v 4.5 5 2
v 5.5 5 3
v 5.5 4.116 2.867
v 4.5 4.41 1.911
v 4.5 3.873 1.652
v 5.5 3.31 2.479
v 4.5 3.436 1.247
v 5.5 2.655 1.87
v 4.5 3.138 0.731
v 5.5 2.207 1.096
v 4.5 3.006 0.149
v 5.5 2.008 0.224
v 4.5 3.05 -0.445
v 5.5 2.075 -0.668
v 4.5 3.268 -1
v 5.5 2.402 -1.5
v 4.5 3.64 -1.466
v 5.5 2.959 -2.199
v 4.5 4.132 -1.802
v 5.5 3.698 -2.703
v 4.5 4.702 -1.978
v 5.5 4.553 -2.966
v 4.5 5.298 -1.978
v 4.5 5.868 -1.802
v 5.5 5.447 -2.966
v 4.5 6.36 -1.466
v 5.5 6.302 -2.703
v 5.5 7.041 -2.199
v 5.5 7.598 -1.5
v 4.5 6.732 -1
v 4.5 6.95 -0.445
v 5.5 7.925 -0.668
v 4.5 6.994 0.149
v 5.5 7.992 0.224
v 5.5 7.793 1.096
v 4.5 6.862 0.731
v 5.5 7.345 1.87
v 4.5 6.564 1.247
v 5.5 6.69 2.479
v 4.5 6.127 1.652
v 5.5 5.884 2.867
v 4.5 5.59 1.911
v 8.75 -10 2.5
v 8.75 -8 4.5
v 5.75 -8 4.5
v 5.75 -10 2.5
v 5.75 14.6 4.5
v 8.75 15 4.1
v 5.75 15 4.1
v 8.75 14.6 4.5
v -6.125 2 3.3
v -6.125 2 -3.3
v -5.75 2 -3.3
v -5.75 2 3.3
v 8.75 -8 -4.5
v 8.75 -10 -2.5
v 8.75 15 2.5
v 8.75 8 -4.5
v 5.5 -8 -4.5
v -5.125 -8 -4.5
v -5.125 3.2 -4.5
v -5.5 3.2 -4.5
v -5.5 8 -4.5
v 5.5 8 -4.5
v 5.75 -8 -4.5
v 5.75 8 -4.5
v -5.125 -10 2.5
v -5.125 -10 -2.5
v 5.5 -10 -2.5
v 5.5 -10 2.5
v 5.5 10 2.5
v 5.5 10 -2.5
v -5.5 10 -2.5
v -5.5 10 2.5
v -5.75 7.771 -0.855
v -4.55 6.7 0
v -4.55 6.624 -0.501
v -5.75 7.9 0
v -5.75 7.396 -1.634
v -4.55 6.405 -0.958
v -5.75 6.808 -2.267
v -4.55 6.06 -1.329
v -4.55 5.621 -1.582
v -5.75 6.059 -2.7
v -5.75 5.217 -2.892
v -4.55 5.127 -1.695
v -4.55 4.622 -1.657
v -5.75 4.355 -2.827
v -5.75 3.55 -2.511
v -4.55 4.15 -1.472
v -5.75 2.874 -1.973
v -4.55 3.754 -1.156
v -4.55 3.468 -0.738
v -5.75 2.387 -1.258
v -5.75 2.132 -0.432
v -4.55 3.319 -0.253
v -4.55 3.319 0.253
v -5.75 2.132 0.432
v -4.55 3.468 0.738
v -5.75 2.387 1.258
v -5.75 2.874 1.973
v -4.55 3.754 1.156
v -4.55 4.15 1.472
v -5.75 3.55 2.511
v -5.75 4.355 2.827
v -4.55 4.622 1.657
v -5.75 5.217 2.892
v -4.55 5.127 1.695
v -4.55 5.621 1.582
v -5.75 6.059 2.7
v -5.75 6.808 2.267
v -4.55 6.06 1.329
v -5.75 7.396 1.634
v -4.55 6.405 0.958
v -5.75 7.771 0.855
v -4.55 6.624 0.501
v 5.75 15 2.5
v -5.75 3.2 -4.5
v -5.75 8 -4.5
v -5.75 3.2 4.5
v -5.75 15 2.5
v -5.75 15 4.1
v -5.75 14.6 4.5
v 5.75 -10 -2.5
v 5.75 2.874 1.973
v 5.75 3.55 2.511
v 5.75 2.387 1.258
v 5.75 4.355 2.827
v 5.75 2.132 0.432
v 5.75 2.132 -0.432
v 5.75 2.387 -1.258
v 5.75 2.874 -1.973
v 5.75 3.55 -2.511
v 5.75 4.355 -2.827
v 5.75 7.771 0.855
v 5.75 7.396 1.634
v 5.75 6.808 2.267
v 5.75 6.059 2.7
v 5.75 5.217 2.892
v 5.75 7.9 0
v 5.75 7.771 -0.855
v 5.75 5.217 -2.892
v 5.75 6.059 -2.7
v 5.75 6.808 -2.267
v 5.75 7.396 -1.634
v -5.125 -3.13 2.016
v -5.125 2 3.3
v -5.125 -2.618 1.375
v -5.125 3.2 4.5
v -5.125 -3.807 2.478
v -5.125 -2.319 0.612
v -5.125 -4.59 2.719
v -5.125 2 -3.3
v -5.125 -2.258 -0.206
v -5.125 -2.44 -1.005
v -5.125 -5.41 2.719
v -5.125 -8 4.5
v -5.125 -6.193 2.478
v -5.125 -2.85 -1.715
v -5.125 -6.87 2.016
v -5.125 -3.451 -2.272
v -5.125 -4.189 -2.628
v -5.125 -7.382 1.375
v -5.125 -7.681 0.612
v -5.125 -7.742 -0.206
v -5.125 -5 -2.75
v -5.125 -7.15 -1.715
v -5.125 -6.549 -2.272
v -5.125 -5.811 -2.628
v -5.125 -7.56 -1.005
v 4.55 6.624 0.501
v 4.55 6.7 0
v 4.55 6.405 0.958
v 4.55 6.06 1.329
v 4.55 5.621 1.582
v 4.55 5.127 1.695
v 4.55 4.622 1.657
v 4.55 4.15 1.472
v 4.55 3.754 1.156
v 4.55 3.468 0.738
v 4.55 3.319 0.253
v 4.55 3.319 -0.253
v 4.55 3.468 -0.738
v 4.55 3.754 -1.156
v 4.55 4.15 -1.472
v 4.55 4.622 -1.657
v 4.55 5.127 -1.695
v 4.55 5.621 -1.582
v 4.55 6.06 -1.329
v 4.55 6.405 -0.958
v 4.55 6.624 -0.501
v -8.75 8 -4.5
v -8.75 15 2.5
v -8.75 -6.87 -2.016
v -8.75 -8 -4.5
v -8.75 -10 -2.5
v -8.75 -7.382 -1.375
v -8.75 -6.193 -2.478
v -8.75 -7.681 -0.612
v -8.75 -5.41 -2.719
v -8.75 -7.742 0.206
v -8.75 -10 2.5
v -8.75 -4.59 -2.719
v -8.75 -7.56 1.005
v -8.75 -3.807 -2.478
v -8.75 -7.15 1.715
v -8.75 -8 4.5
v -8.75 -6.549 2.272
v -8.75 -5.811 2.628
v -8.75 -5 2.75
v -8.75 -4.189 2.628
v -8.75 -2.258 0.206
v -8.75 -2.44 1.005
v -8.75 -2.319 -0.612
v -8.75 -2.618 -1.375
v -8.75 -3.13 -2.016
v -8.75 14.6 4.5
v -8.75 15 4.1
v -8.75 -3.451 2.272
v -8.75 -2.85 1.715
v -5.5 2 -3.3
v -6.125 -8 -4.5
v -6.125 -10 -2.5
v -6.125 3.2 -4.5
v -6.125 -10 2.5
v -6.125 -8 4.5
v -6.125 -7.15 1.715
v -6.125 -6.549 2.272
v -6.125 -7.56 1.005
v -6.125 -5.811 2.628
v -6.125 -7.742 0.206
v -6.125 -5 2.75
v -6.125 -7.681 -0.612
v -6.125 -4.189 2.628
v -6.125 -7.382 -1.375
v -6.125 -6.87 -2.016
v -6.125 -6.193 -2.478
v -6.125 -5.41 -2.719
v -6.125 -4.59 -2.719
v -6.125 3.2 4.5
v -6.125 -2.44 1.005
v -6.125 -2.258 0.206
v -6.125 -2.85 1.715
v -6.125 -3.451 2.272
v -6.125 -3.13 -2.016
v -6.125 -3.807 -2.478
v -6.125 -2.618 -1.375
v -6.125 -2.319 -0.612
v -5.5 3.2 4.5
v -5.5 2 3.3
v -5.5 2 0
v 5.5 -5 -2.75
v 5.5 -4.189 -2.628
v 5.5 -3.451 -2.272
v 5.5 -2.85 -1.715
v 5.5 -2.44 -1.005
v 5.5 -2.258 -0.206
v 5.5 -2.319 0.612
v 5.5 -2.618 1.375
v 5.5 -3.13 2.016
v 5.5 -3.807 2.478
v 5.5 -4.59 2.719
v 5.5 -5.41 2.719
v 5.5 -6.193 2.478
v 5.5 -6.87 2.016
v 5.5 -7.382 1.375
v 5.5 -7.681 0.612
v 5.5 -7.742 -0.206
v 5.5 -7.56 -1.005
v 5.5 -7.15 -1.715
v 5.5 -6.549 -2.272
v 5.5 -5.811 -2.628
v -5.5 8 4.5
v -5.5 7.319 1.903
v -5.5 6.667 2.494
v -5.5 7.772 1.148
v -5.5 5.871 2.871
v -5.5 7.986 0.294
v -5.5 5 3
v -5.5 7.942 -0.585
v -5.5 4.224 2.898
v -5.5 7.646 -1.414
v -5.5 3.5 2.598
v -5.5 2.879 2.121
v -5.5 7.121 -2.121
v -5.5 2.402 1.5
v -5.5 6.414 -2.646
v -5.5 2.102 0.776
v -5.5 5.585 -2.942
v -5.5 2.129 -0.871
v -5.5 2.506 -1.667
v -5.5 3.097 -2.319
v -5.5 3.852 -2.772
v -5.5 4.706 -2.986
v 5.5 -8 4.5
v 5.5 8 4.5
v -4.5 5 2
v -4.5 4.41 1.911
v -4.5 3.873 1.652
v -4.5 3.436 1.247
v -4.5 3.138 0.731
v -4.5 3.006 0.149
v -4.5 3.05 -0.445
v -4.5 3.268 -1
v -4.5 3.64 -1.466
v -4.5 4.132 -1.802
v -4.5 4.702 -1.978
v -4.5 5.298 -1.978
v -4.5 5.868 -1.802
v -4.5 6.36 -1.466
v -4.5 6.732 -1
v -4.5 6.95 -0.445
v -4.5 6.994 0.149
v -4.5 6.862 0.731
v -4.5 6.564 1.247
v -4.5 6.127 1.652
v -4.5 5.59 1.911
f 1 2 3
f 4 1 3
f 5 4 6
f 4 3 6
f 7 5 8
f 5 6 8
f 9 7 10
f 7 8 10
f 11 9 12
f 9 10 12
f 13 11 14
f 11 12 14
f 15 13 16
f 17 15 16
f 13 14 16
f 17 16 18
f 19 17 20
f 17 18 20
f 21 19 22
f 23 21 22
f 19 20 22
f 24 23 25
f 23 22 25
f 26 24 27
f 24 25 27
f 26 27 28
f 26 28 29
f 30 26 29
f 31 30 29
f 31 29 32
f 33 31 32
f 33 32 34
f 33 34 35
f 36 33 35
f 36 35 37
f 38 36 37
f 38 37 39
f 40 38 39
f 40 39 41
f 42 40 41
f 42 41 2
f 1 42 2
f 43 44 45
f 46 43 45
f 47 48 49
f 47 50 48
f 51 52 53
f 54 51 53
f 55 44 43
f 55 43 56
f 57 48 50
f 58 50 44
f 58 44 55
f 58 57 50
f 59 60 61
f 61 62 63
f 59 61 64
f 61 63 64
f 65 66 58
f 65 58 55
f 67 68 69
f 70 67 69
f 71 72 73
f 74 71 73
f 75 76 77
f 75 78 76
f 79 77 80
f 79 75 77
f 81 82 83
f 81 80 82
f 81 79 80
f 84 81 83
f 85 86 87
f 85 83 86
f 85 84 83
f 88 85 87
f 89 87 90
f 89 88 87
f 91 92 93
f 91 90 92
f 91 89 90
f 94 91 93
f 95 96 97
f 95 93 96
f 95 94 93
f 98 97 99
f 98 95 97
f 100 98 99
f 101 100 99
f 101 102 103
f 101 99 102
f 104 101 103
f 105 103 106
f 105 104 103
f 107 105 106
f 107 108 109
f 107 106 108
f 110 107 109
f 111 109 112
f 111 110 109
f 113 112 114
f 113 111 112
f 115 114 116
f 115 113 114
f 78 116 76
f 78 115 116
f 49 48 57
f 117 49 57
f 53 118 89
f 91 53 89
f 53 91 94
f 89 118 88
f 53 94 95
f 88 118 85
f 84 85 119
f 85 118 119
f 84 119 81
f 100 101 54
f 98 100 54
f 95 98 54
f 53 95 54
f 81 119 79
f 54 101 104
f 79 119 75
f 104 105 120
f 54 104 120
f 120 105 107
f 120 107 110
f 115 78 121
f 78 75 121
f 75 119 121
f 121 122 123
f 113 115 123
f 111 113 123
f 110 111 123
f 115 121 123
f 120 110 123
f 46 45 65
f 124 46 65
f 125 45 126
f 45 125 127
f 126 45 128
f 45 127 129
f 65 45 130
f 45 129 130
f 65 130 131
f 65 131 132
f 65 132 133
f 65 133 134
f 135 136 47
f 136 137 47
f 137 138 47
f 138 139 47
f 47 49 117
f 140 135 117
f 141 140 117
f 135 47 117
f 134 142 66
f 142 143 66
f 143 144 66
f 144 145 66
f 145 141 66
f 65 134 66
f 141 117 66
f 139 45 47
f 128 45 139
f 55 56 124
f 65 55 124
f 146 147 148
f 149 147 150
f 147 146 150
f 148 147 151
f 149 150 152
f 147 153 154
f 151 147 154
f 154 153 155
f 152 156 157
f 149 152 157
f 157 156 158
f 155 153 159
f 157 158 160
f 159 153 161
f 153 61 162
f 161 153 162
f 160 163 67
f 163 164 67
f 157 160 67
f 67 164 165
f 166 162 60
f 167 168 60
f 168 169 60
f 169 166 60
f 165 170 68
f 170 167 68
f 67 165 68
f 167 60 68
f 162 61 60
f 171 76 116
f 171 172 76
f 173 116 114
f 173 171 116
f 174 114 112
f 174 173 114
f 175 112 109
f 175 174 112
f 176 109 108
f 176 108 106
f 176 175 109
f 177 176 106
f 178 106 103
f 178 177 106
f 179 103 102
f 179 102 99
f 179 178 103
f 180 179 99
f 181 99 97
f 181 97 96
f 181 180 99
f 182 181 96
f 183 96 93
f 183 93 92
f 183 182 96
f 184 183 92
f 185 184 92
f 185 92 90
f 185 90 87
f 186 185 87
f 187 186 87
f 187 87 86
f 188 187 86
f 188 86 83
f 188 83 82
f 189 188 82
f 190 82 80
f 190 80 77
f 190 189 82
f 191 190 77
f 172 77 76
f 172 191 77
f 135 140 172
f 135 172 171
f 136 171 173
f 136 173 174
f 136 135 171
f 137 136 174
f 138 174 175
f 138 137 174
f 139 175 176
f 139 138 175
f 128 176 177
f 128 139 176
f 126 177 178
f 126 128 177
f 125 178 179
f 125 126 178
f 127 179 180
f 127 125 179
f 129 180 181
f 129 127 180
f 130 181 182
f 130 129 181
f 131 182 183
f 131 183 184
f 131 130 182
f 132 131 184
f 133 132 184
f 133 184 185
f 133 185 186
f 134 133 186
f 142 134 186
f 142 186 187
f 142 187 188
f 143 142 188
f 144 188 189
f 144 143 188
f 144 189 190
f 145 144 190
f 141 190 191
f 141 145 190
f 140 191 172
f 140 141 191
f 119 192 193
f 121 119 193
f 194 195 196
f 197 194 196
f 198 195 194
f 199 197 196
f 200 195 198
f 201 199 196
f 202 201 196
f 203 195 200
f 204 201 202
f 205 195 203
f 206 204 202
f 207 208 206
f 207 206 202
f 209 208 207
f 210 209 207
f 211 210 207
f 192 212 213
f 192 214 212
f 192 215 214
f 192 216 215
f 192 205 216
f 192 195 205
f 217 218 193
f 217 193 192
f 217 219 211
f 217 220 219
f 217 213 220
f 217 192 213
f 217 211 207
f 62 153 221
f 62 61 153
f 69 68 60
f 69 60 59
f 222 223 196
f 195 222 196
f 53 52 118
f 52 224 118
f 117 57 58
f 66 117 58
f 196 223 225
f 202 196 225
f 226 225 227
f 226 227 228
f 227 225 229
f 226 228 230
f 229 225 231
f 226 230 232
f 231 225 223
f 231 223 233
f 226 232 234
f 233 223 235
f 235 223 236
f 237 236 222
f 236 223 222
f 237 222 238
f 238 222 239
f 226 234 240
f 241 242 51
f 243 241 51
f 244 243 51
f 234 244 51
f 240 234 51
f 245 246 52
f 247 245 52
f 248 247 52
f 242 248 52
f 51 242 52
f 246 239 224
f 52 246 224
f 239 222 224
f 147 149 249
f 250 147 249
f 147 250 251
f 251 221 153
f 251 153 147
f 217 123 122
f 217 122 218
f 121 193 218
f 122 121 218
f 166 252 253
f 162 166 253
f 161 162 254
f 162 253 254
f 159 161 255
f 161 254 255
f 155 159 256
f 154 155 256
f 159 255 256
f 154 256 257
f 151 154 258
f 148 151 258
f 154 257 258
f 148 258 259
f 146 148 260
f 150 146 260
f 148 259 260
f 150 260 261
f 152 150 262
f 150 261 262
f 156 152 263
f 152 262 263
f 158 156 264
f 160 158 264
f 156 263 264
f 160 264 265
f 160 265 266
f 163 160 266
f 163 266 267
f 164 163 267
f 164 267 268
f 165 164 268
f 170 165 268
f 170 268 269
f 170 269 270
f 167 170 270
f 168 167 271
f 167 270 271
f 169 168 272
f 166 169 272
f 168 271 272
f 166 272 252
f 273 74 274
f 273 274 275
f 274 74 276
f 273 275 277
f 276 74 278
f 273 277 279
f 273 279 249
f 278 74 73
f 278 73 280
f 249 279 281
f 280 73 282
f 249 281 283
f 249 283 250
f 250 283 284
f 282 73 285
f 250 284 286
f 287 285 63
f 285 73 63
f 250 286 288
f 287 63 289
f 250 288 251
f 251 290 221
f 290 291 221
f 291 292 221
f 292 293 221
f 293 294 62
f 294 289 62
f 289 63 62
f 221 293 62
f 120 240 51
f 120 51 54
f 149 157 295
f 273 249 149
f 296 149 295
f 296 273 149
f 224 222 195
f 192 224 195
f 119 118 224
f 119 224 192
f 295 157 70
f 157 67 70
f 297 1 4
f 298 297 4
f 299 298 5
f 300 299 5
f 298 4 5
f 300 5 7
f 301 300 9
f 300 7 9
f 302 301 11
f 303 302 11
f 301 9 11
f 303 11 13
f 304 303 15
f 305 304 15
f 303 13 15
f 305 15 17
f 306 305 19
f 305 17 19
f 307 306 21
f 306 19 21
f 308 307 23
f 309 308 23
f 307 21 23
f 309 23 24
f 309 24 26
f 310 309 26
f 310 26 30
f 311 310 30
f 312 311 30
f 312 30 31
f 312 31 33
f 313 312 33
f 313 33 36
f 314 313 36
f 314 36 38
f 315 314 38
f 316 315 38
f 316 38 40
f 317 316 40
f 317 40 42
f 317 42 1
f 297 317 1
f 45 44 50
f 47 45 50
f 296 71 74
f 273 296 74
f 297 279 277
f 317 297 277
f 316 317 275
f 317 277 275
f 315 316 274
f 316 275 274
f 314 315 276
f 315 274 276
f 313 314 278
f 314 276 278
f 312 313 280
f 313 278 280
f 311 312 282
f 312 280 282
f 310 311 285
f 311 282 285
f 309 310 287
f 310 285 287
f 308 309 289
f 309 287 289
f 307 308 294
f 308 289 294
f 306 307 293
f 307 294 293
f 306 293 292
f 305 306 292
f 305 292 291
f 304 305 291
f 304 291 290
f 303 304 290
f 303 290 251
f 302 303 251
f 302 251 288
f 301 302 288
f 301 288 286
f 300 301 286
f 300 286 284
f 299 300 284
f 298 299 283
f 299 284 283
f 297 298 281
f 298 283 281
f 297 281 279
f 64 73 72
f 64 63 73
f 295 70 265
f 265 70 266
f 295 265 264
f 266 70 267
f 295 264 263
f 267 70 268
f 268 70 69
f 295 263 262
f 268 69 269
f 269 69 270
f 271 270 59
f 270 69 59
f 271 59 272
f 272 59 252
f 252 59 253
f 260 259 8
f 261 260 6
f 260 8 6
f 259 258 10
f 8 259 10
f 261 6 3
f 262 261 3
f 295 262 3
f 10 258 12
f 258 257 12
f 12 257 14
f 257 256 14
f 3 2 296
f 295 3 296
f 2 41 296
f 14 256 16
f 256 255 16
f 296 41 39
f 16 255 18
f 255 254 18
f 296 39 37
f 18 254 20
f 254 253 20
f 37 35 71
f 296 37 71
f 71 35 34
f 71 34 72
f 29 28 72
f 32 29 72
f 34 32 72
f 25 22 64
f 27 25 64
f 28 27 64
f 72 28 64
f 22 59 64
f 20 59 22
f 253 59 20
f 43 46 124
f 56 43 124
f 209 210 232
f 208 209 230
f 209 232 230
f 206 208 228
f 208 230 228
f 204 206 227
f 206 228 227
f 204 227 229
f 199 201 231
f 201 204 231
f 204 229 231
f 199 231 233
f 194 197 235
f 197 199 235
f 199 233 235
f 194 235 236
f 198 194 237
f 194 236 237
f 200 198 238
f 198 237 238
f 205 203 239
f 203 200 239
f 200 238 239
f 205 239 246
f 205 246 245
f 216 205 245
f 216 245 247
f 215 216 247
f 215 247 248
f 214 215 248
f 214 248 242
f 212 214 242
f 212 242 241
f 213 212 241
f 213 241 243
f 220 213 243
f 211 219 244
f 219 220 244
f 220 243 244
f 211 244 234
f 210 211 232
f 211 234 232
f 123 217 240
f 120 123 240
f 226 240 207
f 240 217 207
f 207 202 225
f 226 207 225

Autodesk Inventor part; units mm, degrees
ref_plane "YZ Plane" through (0, 0, 0) normal (1, 0, 0) x (0, 1, 0)
ref_plane "XZ Plane" through (0, 0, 0) normal (0, 1, 0) x (-1, 0, 0)
ref_plane "XY Plane" through (0, 0, 0) normal (0, 0, 1) x (1, 0, 0)
sketch "スケッチ1" plane through (0, 0, 0) normal (0, 0, 1) x (1, 0, 0)
  line L0 (-5.5, -10) -> (5.5, -10)
  line L1 (5.5, -10) -> (5.5, 10)
  line L2 (5.5, 10) -> (-5.5, 10)
  line L3 (-5.5, 10) -> (-5.5, -10)
  line L4 (-5.5, -10) -> (5.5, 10) construction
  line L5 (5.5, -10) -> (-5.5, 10) construction
  point P0 (0, 0)
  dimension "d0" = 11
  dimension "d1" = 20
extrude "押し出し1" add sketch "スケッチ1" along normal mid plane 9
sketch "スケッチ2" plane through (5.5, -10, 4.5) normal (1, 0, 0) x (0, 0, -1)
  circle A0 centre (4.5, 5) radius 2.75
  point P0 (4.5, 10)
  dimension "d4" = 5.5
  dimension "d5" = 5
extrude "押し出し2" cut sketch "スケッチ2" against normal through all
sketch "スケッチ3" plane through (-5.5, -10, 4.5) normal (-1, 0, 0) x (0, 0, 1)
  point P0 (-4.5, 10)
  point P1 (-4.5, 15)
  dimension "d8" = 5
hole "穴1" at (-5.5, 5, 0) direction (1, 0, 0) diameter 4 end through all
sketch "スケッチ4" plane through (0, 0, 0) normal (1, 0, 0) x (0, 1, 0)
  circle A0 centre (5, 0) radius 2 projected
  circle A1 centre (5, 0) radius 1.7
  point P0 (0, 0)
  dimension "d16" = 0.3
extrude "押し出し3" add sketch "スケッチ4" along normal mid plane 11.5 contours A1
sketch "スケッチ5" plane through (-5.75, 5, 0) normal (-1, 0, 0) x (0, 0, 1)
  line L0 (4.5, 5) -> (4.5, -15) projected
  line L1 (-4.5, 5) -> (4.5, 5) projected
  line L2 (-4.5, -15) -> (-4.5, 5) projected
  line L3 (-4.5, -15) -> (4.5, -15) projected
  circle A0 centre (0, -10) radius 2.75 projected
  point P0 (0, -5)
extrude "押し出し4" add sketch "スケッチ5" along normal blind 3
sketch "スケッチ6" plane through (5.75, 5, 0) normal (1, 0, 0) x (0, 0, -1)
  line L0 (4.5, 5) -> (4.5, -15) projected
  line L1 (4.5, 5) -> (-4.5, 5) projected
  line L2 (-4.5, -15) -> (-4.5, 5) projected
  line L3 (-4.5, -15) -> (4.5, -15) projected
  point P0 (0, -5)
extrude "押し出し5" add sketch "スケッチ6" along normal blind 3
chamfer "面取り1" distance 1 angle 45 2 edges at (-5.5, 5, -2) (5.5, 5, -2)
chamfer "面取り2" distance 1.2 angle 45 2 edges at (5.75, 3.3, 0) (-5.75, 3.3, 0)
sketch "スケッチ7" plane through (-5.75, -10, -4.5) normal (0, 0, -1) x (-1, 0, 0)
  line L0 (-0.25, 7.75) -> (-0.25, 2.25) projected
  line L1 (0, 7.75) -> (0, 2.25) projected
  line L2 (-0.25, 5) -> (0, 5) construction
  line L3 (-0.625, -2) -> (0.375, -2)
  line L4 (0.375, -2) -> (0.375, 12)
  line L5 (0.375, 12) -> (-0.625, 12)
  line L6 (-0.625, 12) -> (-0.625, -2)
  line L7 (-0.625, -2) -> (0.375, 12) construction
  line L8 (0.375, -2) -> (-0.625, 12) construction
  point P0 (-5.75, 10)
  point P1 (-0.125, 5)
  dimension "d29" = 1
  dimension "d30" = 14
extrude "押し出し6" cut sketch "スケッチ7" against normal through all
chamfer "面取り3" distance 1.2 angle 45 4 edges at (-5.3125, 2, 4.5) (-5.9375, 2, 4.5) (-5.9375, 2, -4.5) (-5.3125, 2, -4.5)
chamfer "面取り4" distance 2 angle 45 10 edges at (-7.4375, -10, 4.5) (0.1875, -10, 4.5) (7.25, -10, 4.5) (7.25, -10, -4.5) (0.1875, -10, -4.5) (-7.4375, -10, -4.5) (7.25, 10, -4.5) (0, 10, -4.5) (-7.25, 10, -4.5) (0, 10, 4.5)
sketch "スケッチ8" plane through (-8.75, 5, 0) normal (-1, 0, 0) x (0, 0, 1)
  line L0 (4.5, 5) -> (-2.5, 5) projected
  line L1 (4.5, -13) -> (4.5, 5) projected
  line L2 (-2.5, 5) -> (-4.5, 3) projected
  line L3 (-2.5, 5) -> (2.5, 10)
  line L4 (2.5, 10) -> (4.5, 10)
  line L5 (4.5, 10) -> (4.5, 5)
  point P0 (0, -5)
  dimension "d39" = 5
extrude "押し出し7" add sketch "スケッチ8" against normal up to surface (3 mm away)
chamfer "面取り5" distance 0.4 angle 45 1 edges at (-7.25, 15, 4.5)
mirror "ミラー1" about plane through (0, 0, 0) normal (1, 0, 0) of "押し出し7", "面取り5"
properties part number "3D_jigu_3D プリント"
